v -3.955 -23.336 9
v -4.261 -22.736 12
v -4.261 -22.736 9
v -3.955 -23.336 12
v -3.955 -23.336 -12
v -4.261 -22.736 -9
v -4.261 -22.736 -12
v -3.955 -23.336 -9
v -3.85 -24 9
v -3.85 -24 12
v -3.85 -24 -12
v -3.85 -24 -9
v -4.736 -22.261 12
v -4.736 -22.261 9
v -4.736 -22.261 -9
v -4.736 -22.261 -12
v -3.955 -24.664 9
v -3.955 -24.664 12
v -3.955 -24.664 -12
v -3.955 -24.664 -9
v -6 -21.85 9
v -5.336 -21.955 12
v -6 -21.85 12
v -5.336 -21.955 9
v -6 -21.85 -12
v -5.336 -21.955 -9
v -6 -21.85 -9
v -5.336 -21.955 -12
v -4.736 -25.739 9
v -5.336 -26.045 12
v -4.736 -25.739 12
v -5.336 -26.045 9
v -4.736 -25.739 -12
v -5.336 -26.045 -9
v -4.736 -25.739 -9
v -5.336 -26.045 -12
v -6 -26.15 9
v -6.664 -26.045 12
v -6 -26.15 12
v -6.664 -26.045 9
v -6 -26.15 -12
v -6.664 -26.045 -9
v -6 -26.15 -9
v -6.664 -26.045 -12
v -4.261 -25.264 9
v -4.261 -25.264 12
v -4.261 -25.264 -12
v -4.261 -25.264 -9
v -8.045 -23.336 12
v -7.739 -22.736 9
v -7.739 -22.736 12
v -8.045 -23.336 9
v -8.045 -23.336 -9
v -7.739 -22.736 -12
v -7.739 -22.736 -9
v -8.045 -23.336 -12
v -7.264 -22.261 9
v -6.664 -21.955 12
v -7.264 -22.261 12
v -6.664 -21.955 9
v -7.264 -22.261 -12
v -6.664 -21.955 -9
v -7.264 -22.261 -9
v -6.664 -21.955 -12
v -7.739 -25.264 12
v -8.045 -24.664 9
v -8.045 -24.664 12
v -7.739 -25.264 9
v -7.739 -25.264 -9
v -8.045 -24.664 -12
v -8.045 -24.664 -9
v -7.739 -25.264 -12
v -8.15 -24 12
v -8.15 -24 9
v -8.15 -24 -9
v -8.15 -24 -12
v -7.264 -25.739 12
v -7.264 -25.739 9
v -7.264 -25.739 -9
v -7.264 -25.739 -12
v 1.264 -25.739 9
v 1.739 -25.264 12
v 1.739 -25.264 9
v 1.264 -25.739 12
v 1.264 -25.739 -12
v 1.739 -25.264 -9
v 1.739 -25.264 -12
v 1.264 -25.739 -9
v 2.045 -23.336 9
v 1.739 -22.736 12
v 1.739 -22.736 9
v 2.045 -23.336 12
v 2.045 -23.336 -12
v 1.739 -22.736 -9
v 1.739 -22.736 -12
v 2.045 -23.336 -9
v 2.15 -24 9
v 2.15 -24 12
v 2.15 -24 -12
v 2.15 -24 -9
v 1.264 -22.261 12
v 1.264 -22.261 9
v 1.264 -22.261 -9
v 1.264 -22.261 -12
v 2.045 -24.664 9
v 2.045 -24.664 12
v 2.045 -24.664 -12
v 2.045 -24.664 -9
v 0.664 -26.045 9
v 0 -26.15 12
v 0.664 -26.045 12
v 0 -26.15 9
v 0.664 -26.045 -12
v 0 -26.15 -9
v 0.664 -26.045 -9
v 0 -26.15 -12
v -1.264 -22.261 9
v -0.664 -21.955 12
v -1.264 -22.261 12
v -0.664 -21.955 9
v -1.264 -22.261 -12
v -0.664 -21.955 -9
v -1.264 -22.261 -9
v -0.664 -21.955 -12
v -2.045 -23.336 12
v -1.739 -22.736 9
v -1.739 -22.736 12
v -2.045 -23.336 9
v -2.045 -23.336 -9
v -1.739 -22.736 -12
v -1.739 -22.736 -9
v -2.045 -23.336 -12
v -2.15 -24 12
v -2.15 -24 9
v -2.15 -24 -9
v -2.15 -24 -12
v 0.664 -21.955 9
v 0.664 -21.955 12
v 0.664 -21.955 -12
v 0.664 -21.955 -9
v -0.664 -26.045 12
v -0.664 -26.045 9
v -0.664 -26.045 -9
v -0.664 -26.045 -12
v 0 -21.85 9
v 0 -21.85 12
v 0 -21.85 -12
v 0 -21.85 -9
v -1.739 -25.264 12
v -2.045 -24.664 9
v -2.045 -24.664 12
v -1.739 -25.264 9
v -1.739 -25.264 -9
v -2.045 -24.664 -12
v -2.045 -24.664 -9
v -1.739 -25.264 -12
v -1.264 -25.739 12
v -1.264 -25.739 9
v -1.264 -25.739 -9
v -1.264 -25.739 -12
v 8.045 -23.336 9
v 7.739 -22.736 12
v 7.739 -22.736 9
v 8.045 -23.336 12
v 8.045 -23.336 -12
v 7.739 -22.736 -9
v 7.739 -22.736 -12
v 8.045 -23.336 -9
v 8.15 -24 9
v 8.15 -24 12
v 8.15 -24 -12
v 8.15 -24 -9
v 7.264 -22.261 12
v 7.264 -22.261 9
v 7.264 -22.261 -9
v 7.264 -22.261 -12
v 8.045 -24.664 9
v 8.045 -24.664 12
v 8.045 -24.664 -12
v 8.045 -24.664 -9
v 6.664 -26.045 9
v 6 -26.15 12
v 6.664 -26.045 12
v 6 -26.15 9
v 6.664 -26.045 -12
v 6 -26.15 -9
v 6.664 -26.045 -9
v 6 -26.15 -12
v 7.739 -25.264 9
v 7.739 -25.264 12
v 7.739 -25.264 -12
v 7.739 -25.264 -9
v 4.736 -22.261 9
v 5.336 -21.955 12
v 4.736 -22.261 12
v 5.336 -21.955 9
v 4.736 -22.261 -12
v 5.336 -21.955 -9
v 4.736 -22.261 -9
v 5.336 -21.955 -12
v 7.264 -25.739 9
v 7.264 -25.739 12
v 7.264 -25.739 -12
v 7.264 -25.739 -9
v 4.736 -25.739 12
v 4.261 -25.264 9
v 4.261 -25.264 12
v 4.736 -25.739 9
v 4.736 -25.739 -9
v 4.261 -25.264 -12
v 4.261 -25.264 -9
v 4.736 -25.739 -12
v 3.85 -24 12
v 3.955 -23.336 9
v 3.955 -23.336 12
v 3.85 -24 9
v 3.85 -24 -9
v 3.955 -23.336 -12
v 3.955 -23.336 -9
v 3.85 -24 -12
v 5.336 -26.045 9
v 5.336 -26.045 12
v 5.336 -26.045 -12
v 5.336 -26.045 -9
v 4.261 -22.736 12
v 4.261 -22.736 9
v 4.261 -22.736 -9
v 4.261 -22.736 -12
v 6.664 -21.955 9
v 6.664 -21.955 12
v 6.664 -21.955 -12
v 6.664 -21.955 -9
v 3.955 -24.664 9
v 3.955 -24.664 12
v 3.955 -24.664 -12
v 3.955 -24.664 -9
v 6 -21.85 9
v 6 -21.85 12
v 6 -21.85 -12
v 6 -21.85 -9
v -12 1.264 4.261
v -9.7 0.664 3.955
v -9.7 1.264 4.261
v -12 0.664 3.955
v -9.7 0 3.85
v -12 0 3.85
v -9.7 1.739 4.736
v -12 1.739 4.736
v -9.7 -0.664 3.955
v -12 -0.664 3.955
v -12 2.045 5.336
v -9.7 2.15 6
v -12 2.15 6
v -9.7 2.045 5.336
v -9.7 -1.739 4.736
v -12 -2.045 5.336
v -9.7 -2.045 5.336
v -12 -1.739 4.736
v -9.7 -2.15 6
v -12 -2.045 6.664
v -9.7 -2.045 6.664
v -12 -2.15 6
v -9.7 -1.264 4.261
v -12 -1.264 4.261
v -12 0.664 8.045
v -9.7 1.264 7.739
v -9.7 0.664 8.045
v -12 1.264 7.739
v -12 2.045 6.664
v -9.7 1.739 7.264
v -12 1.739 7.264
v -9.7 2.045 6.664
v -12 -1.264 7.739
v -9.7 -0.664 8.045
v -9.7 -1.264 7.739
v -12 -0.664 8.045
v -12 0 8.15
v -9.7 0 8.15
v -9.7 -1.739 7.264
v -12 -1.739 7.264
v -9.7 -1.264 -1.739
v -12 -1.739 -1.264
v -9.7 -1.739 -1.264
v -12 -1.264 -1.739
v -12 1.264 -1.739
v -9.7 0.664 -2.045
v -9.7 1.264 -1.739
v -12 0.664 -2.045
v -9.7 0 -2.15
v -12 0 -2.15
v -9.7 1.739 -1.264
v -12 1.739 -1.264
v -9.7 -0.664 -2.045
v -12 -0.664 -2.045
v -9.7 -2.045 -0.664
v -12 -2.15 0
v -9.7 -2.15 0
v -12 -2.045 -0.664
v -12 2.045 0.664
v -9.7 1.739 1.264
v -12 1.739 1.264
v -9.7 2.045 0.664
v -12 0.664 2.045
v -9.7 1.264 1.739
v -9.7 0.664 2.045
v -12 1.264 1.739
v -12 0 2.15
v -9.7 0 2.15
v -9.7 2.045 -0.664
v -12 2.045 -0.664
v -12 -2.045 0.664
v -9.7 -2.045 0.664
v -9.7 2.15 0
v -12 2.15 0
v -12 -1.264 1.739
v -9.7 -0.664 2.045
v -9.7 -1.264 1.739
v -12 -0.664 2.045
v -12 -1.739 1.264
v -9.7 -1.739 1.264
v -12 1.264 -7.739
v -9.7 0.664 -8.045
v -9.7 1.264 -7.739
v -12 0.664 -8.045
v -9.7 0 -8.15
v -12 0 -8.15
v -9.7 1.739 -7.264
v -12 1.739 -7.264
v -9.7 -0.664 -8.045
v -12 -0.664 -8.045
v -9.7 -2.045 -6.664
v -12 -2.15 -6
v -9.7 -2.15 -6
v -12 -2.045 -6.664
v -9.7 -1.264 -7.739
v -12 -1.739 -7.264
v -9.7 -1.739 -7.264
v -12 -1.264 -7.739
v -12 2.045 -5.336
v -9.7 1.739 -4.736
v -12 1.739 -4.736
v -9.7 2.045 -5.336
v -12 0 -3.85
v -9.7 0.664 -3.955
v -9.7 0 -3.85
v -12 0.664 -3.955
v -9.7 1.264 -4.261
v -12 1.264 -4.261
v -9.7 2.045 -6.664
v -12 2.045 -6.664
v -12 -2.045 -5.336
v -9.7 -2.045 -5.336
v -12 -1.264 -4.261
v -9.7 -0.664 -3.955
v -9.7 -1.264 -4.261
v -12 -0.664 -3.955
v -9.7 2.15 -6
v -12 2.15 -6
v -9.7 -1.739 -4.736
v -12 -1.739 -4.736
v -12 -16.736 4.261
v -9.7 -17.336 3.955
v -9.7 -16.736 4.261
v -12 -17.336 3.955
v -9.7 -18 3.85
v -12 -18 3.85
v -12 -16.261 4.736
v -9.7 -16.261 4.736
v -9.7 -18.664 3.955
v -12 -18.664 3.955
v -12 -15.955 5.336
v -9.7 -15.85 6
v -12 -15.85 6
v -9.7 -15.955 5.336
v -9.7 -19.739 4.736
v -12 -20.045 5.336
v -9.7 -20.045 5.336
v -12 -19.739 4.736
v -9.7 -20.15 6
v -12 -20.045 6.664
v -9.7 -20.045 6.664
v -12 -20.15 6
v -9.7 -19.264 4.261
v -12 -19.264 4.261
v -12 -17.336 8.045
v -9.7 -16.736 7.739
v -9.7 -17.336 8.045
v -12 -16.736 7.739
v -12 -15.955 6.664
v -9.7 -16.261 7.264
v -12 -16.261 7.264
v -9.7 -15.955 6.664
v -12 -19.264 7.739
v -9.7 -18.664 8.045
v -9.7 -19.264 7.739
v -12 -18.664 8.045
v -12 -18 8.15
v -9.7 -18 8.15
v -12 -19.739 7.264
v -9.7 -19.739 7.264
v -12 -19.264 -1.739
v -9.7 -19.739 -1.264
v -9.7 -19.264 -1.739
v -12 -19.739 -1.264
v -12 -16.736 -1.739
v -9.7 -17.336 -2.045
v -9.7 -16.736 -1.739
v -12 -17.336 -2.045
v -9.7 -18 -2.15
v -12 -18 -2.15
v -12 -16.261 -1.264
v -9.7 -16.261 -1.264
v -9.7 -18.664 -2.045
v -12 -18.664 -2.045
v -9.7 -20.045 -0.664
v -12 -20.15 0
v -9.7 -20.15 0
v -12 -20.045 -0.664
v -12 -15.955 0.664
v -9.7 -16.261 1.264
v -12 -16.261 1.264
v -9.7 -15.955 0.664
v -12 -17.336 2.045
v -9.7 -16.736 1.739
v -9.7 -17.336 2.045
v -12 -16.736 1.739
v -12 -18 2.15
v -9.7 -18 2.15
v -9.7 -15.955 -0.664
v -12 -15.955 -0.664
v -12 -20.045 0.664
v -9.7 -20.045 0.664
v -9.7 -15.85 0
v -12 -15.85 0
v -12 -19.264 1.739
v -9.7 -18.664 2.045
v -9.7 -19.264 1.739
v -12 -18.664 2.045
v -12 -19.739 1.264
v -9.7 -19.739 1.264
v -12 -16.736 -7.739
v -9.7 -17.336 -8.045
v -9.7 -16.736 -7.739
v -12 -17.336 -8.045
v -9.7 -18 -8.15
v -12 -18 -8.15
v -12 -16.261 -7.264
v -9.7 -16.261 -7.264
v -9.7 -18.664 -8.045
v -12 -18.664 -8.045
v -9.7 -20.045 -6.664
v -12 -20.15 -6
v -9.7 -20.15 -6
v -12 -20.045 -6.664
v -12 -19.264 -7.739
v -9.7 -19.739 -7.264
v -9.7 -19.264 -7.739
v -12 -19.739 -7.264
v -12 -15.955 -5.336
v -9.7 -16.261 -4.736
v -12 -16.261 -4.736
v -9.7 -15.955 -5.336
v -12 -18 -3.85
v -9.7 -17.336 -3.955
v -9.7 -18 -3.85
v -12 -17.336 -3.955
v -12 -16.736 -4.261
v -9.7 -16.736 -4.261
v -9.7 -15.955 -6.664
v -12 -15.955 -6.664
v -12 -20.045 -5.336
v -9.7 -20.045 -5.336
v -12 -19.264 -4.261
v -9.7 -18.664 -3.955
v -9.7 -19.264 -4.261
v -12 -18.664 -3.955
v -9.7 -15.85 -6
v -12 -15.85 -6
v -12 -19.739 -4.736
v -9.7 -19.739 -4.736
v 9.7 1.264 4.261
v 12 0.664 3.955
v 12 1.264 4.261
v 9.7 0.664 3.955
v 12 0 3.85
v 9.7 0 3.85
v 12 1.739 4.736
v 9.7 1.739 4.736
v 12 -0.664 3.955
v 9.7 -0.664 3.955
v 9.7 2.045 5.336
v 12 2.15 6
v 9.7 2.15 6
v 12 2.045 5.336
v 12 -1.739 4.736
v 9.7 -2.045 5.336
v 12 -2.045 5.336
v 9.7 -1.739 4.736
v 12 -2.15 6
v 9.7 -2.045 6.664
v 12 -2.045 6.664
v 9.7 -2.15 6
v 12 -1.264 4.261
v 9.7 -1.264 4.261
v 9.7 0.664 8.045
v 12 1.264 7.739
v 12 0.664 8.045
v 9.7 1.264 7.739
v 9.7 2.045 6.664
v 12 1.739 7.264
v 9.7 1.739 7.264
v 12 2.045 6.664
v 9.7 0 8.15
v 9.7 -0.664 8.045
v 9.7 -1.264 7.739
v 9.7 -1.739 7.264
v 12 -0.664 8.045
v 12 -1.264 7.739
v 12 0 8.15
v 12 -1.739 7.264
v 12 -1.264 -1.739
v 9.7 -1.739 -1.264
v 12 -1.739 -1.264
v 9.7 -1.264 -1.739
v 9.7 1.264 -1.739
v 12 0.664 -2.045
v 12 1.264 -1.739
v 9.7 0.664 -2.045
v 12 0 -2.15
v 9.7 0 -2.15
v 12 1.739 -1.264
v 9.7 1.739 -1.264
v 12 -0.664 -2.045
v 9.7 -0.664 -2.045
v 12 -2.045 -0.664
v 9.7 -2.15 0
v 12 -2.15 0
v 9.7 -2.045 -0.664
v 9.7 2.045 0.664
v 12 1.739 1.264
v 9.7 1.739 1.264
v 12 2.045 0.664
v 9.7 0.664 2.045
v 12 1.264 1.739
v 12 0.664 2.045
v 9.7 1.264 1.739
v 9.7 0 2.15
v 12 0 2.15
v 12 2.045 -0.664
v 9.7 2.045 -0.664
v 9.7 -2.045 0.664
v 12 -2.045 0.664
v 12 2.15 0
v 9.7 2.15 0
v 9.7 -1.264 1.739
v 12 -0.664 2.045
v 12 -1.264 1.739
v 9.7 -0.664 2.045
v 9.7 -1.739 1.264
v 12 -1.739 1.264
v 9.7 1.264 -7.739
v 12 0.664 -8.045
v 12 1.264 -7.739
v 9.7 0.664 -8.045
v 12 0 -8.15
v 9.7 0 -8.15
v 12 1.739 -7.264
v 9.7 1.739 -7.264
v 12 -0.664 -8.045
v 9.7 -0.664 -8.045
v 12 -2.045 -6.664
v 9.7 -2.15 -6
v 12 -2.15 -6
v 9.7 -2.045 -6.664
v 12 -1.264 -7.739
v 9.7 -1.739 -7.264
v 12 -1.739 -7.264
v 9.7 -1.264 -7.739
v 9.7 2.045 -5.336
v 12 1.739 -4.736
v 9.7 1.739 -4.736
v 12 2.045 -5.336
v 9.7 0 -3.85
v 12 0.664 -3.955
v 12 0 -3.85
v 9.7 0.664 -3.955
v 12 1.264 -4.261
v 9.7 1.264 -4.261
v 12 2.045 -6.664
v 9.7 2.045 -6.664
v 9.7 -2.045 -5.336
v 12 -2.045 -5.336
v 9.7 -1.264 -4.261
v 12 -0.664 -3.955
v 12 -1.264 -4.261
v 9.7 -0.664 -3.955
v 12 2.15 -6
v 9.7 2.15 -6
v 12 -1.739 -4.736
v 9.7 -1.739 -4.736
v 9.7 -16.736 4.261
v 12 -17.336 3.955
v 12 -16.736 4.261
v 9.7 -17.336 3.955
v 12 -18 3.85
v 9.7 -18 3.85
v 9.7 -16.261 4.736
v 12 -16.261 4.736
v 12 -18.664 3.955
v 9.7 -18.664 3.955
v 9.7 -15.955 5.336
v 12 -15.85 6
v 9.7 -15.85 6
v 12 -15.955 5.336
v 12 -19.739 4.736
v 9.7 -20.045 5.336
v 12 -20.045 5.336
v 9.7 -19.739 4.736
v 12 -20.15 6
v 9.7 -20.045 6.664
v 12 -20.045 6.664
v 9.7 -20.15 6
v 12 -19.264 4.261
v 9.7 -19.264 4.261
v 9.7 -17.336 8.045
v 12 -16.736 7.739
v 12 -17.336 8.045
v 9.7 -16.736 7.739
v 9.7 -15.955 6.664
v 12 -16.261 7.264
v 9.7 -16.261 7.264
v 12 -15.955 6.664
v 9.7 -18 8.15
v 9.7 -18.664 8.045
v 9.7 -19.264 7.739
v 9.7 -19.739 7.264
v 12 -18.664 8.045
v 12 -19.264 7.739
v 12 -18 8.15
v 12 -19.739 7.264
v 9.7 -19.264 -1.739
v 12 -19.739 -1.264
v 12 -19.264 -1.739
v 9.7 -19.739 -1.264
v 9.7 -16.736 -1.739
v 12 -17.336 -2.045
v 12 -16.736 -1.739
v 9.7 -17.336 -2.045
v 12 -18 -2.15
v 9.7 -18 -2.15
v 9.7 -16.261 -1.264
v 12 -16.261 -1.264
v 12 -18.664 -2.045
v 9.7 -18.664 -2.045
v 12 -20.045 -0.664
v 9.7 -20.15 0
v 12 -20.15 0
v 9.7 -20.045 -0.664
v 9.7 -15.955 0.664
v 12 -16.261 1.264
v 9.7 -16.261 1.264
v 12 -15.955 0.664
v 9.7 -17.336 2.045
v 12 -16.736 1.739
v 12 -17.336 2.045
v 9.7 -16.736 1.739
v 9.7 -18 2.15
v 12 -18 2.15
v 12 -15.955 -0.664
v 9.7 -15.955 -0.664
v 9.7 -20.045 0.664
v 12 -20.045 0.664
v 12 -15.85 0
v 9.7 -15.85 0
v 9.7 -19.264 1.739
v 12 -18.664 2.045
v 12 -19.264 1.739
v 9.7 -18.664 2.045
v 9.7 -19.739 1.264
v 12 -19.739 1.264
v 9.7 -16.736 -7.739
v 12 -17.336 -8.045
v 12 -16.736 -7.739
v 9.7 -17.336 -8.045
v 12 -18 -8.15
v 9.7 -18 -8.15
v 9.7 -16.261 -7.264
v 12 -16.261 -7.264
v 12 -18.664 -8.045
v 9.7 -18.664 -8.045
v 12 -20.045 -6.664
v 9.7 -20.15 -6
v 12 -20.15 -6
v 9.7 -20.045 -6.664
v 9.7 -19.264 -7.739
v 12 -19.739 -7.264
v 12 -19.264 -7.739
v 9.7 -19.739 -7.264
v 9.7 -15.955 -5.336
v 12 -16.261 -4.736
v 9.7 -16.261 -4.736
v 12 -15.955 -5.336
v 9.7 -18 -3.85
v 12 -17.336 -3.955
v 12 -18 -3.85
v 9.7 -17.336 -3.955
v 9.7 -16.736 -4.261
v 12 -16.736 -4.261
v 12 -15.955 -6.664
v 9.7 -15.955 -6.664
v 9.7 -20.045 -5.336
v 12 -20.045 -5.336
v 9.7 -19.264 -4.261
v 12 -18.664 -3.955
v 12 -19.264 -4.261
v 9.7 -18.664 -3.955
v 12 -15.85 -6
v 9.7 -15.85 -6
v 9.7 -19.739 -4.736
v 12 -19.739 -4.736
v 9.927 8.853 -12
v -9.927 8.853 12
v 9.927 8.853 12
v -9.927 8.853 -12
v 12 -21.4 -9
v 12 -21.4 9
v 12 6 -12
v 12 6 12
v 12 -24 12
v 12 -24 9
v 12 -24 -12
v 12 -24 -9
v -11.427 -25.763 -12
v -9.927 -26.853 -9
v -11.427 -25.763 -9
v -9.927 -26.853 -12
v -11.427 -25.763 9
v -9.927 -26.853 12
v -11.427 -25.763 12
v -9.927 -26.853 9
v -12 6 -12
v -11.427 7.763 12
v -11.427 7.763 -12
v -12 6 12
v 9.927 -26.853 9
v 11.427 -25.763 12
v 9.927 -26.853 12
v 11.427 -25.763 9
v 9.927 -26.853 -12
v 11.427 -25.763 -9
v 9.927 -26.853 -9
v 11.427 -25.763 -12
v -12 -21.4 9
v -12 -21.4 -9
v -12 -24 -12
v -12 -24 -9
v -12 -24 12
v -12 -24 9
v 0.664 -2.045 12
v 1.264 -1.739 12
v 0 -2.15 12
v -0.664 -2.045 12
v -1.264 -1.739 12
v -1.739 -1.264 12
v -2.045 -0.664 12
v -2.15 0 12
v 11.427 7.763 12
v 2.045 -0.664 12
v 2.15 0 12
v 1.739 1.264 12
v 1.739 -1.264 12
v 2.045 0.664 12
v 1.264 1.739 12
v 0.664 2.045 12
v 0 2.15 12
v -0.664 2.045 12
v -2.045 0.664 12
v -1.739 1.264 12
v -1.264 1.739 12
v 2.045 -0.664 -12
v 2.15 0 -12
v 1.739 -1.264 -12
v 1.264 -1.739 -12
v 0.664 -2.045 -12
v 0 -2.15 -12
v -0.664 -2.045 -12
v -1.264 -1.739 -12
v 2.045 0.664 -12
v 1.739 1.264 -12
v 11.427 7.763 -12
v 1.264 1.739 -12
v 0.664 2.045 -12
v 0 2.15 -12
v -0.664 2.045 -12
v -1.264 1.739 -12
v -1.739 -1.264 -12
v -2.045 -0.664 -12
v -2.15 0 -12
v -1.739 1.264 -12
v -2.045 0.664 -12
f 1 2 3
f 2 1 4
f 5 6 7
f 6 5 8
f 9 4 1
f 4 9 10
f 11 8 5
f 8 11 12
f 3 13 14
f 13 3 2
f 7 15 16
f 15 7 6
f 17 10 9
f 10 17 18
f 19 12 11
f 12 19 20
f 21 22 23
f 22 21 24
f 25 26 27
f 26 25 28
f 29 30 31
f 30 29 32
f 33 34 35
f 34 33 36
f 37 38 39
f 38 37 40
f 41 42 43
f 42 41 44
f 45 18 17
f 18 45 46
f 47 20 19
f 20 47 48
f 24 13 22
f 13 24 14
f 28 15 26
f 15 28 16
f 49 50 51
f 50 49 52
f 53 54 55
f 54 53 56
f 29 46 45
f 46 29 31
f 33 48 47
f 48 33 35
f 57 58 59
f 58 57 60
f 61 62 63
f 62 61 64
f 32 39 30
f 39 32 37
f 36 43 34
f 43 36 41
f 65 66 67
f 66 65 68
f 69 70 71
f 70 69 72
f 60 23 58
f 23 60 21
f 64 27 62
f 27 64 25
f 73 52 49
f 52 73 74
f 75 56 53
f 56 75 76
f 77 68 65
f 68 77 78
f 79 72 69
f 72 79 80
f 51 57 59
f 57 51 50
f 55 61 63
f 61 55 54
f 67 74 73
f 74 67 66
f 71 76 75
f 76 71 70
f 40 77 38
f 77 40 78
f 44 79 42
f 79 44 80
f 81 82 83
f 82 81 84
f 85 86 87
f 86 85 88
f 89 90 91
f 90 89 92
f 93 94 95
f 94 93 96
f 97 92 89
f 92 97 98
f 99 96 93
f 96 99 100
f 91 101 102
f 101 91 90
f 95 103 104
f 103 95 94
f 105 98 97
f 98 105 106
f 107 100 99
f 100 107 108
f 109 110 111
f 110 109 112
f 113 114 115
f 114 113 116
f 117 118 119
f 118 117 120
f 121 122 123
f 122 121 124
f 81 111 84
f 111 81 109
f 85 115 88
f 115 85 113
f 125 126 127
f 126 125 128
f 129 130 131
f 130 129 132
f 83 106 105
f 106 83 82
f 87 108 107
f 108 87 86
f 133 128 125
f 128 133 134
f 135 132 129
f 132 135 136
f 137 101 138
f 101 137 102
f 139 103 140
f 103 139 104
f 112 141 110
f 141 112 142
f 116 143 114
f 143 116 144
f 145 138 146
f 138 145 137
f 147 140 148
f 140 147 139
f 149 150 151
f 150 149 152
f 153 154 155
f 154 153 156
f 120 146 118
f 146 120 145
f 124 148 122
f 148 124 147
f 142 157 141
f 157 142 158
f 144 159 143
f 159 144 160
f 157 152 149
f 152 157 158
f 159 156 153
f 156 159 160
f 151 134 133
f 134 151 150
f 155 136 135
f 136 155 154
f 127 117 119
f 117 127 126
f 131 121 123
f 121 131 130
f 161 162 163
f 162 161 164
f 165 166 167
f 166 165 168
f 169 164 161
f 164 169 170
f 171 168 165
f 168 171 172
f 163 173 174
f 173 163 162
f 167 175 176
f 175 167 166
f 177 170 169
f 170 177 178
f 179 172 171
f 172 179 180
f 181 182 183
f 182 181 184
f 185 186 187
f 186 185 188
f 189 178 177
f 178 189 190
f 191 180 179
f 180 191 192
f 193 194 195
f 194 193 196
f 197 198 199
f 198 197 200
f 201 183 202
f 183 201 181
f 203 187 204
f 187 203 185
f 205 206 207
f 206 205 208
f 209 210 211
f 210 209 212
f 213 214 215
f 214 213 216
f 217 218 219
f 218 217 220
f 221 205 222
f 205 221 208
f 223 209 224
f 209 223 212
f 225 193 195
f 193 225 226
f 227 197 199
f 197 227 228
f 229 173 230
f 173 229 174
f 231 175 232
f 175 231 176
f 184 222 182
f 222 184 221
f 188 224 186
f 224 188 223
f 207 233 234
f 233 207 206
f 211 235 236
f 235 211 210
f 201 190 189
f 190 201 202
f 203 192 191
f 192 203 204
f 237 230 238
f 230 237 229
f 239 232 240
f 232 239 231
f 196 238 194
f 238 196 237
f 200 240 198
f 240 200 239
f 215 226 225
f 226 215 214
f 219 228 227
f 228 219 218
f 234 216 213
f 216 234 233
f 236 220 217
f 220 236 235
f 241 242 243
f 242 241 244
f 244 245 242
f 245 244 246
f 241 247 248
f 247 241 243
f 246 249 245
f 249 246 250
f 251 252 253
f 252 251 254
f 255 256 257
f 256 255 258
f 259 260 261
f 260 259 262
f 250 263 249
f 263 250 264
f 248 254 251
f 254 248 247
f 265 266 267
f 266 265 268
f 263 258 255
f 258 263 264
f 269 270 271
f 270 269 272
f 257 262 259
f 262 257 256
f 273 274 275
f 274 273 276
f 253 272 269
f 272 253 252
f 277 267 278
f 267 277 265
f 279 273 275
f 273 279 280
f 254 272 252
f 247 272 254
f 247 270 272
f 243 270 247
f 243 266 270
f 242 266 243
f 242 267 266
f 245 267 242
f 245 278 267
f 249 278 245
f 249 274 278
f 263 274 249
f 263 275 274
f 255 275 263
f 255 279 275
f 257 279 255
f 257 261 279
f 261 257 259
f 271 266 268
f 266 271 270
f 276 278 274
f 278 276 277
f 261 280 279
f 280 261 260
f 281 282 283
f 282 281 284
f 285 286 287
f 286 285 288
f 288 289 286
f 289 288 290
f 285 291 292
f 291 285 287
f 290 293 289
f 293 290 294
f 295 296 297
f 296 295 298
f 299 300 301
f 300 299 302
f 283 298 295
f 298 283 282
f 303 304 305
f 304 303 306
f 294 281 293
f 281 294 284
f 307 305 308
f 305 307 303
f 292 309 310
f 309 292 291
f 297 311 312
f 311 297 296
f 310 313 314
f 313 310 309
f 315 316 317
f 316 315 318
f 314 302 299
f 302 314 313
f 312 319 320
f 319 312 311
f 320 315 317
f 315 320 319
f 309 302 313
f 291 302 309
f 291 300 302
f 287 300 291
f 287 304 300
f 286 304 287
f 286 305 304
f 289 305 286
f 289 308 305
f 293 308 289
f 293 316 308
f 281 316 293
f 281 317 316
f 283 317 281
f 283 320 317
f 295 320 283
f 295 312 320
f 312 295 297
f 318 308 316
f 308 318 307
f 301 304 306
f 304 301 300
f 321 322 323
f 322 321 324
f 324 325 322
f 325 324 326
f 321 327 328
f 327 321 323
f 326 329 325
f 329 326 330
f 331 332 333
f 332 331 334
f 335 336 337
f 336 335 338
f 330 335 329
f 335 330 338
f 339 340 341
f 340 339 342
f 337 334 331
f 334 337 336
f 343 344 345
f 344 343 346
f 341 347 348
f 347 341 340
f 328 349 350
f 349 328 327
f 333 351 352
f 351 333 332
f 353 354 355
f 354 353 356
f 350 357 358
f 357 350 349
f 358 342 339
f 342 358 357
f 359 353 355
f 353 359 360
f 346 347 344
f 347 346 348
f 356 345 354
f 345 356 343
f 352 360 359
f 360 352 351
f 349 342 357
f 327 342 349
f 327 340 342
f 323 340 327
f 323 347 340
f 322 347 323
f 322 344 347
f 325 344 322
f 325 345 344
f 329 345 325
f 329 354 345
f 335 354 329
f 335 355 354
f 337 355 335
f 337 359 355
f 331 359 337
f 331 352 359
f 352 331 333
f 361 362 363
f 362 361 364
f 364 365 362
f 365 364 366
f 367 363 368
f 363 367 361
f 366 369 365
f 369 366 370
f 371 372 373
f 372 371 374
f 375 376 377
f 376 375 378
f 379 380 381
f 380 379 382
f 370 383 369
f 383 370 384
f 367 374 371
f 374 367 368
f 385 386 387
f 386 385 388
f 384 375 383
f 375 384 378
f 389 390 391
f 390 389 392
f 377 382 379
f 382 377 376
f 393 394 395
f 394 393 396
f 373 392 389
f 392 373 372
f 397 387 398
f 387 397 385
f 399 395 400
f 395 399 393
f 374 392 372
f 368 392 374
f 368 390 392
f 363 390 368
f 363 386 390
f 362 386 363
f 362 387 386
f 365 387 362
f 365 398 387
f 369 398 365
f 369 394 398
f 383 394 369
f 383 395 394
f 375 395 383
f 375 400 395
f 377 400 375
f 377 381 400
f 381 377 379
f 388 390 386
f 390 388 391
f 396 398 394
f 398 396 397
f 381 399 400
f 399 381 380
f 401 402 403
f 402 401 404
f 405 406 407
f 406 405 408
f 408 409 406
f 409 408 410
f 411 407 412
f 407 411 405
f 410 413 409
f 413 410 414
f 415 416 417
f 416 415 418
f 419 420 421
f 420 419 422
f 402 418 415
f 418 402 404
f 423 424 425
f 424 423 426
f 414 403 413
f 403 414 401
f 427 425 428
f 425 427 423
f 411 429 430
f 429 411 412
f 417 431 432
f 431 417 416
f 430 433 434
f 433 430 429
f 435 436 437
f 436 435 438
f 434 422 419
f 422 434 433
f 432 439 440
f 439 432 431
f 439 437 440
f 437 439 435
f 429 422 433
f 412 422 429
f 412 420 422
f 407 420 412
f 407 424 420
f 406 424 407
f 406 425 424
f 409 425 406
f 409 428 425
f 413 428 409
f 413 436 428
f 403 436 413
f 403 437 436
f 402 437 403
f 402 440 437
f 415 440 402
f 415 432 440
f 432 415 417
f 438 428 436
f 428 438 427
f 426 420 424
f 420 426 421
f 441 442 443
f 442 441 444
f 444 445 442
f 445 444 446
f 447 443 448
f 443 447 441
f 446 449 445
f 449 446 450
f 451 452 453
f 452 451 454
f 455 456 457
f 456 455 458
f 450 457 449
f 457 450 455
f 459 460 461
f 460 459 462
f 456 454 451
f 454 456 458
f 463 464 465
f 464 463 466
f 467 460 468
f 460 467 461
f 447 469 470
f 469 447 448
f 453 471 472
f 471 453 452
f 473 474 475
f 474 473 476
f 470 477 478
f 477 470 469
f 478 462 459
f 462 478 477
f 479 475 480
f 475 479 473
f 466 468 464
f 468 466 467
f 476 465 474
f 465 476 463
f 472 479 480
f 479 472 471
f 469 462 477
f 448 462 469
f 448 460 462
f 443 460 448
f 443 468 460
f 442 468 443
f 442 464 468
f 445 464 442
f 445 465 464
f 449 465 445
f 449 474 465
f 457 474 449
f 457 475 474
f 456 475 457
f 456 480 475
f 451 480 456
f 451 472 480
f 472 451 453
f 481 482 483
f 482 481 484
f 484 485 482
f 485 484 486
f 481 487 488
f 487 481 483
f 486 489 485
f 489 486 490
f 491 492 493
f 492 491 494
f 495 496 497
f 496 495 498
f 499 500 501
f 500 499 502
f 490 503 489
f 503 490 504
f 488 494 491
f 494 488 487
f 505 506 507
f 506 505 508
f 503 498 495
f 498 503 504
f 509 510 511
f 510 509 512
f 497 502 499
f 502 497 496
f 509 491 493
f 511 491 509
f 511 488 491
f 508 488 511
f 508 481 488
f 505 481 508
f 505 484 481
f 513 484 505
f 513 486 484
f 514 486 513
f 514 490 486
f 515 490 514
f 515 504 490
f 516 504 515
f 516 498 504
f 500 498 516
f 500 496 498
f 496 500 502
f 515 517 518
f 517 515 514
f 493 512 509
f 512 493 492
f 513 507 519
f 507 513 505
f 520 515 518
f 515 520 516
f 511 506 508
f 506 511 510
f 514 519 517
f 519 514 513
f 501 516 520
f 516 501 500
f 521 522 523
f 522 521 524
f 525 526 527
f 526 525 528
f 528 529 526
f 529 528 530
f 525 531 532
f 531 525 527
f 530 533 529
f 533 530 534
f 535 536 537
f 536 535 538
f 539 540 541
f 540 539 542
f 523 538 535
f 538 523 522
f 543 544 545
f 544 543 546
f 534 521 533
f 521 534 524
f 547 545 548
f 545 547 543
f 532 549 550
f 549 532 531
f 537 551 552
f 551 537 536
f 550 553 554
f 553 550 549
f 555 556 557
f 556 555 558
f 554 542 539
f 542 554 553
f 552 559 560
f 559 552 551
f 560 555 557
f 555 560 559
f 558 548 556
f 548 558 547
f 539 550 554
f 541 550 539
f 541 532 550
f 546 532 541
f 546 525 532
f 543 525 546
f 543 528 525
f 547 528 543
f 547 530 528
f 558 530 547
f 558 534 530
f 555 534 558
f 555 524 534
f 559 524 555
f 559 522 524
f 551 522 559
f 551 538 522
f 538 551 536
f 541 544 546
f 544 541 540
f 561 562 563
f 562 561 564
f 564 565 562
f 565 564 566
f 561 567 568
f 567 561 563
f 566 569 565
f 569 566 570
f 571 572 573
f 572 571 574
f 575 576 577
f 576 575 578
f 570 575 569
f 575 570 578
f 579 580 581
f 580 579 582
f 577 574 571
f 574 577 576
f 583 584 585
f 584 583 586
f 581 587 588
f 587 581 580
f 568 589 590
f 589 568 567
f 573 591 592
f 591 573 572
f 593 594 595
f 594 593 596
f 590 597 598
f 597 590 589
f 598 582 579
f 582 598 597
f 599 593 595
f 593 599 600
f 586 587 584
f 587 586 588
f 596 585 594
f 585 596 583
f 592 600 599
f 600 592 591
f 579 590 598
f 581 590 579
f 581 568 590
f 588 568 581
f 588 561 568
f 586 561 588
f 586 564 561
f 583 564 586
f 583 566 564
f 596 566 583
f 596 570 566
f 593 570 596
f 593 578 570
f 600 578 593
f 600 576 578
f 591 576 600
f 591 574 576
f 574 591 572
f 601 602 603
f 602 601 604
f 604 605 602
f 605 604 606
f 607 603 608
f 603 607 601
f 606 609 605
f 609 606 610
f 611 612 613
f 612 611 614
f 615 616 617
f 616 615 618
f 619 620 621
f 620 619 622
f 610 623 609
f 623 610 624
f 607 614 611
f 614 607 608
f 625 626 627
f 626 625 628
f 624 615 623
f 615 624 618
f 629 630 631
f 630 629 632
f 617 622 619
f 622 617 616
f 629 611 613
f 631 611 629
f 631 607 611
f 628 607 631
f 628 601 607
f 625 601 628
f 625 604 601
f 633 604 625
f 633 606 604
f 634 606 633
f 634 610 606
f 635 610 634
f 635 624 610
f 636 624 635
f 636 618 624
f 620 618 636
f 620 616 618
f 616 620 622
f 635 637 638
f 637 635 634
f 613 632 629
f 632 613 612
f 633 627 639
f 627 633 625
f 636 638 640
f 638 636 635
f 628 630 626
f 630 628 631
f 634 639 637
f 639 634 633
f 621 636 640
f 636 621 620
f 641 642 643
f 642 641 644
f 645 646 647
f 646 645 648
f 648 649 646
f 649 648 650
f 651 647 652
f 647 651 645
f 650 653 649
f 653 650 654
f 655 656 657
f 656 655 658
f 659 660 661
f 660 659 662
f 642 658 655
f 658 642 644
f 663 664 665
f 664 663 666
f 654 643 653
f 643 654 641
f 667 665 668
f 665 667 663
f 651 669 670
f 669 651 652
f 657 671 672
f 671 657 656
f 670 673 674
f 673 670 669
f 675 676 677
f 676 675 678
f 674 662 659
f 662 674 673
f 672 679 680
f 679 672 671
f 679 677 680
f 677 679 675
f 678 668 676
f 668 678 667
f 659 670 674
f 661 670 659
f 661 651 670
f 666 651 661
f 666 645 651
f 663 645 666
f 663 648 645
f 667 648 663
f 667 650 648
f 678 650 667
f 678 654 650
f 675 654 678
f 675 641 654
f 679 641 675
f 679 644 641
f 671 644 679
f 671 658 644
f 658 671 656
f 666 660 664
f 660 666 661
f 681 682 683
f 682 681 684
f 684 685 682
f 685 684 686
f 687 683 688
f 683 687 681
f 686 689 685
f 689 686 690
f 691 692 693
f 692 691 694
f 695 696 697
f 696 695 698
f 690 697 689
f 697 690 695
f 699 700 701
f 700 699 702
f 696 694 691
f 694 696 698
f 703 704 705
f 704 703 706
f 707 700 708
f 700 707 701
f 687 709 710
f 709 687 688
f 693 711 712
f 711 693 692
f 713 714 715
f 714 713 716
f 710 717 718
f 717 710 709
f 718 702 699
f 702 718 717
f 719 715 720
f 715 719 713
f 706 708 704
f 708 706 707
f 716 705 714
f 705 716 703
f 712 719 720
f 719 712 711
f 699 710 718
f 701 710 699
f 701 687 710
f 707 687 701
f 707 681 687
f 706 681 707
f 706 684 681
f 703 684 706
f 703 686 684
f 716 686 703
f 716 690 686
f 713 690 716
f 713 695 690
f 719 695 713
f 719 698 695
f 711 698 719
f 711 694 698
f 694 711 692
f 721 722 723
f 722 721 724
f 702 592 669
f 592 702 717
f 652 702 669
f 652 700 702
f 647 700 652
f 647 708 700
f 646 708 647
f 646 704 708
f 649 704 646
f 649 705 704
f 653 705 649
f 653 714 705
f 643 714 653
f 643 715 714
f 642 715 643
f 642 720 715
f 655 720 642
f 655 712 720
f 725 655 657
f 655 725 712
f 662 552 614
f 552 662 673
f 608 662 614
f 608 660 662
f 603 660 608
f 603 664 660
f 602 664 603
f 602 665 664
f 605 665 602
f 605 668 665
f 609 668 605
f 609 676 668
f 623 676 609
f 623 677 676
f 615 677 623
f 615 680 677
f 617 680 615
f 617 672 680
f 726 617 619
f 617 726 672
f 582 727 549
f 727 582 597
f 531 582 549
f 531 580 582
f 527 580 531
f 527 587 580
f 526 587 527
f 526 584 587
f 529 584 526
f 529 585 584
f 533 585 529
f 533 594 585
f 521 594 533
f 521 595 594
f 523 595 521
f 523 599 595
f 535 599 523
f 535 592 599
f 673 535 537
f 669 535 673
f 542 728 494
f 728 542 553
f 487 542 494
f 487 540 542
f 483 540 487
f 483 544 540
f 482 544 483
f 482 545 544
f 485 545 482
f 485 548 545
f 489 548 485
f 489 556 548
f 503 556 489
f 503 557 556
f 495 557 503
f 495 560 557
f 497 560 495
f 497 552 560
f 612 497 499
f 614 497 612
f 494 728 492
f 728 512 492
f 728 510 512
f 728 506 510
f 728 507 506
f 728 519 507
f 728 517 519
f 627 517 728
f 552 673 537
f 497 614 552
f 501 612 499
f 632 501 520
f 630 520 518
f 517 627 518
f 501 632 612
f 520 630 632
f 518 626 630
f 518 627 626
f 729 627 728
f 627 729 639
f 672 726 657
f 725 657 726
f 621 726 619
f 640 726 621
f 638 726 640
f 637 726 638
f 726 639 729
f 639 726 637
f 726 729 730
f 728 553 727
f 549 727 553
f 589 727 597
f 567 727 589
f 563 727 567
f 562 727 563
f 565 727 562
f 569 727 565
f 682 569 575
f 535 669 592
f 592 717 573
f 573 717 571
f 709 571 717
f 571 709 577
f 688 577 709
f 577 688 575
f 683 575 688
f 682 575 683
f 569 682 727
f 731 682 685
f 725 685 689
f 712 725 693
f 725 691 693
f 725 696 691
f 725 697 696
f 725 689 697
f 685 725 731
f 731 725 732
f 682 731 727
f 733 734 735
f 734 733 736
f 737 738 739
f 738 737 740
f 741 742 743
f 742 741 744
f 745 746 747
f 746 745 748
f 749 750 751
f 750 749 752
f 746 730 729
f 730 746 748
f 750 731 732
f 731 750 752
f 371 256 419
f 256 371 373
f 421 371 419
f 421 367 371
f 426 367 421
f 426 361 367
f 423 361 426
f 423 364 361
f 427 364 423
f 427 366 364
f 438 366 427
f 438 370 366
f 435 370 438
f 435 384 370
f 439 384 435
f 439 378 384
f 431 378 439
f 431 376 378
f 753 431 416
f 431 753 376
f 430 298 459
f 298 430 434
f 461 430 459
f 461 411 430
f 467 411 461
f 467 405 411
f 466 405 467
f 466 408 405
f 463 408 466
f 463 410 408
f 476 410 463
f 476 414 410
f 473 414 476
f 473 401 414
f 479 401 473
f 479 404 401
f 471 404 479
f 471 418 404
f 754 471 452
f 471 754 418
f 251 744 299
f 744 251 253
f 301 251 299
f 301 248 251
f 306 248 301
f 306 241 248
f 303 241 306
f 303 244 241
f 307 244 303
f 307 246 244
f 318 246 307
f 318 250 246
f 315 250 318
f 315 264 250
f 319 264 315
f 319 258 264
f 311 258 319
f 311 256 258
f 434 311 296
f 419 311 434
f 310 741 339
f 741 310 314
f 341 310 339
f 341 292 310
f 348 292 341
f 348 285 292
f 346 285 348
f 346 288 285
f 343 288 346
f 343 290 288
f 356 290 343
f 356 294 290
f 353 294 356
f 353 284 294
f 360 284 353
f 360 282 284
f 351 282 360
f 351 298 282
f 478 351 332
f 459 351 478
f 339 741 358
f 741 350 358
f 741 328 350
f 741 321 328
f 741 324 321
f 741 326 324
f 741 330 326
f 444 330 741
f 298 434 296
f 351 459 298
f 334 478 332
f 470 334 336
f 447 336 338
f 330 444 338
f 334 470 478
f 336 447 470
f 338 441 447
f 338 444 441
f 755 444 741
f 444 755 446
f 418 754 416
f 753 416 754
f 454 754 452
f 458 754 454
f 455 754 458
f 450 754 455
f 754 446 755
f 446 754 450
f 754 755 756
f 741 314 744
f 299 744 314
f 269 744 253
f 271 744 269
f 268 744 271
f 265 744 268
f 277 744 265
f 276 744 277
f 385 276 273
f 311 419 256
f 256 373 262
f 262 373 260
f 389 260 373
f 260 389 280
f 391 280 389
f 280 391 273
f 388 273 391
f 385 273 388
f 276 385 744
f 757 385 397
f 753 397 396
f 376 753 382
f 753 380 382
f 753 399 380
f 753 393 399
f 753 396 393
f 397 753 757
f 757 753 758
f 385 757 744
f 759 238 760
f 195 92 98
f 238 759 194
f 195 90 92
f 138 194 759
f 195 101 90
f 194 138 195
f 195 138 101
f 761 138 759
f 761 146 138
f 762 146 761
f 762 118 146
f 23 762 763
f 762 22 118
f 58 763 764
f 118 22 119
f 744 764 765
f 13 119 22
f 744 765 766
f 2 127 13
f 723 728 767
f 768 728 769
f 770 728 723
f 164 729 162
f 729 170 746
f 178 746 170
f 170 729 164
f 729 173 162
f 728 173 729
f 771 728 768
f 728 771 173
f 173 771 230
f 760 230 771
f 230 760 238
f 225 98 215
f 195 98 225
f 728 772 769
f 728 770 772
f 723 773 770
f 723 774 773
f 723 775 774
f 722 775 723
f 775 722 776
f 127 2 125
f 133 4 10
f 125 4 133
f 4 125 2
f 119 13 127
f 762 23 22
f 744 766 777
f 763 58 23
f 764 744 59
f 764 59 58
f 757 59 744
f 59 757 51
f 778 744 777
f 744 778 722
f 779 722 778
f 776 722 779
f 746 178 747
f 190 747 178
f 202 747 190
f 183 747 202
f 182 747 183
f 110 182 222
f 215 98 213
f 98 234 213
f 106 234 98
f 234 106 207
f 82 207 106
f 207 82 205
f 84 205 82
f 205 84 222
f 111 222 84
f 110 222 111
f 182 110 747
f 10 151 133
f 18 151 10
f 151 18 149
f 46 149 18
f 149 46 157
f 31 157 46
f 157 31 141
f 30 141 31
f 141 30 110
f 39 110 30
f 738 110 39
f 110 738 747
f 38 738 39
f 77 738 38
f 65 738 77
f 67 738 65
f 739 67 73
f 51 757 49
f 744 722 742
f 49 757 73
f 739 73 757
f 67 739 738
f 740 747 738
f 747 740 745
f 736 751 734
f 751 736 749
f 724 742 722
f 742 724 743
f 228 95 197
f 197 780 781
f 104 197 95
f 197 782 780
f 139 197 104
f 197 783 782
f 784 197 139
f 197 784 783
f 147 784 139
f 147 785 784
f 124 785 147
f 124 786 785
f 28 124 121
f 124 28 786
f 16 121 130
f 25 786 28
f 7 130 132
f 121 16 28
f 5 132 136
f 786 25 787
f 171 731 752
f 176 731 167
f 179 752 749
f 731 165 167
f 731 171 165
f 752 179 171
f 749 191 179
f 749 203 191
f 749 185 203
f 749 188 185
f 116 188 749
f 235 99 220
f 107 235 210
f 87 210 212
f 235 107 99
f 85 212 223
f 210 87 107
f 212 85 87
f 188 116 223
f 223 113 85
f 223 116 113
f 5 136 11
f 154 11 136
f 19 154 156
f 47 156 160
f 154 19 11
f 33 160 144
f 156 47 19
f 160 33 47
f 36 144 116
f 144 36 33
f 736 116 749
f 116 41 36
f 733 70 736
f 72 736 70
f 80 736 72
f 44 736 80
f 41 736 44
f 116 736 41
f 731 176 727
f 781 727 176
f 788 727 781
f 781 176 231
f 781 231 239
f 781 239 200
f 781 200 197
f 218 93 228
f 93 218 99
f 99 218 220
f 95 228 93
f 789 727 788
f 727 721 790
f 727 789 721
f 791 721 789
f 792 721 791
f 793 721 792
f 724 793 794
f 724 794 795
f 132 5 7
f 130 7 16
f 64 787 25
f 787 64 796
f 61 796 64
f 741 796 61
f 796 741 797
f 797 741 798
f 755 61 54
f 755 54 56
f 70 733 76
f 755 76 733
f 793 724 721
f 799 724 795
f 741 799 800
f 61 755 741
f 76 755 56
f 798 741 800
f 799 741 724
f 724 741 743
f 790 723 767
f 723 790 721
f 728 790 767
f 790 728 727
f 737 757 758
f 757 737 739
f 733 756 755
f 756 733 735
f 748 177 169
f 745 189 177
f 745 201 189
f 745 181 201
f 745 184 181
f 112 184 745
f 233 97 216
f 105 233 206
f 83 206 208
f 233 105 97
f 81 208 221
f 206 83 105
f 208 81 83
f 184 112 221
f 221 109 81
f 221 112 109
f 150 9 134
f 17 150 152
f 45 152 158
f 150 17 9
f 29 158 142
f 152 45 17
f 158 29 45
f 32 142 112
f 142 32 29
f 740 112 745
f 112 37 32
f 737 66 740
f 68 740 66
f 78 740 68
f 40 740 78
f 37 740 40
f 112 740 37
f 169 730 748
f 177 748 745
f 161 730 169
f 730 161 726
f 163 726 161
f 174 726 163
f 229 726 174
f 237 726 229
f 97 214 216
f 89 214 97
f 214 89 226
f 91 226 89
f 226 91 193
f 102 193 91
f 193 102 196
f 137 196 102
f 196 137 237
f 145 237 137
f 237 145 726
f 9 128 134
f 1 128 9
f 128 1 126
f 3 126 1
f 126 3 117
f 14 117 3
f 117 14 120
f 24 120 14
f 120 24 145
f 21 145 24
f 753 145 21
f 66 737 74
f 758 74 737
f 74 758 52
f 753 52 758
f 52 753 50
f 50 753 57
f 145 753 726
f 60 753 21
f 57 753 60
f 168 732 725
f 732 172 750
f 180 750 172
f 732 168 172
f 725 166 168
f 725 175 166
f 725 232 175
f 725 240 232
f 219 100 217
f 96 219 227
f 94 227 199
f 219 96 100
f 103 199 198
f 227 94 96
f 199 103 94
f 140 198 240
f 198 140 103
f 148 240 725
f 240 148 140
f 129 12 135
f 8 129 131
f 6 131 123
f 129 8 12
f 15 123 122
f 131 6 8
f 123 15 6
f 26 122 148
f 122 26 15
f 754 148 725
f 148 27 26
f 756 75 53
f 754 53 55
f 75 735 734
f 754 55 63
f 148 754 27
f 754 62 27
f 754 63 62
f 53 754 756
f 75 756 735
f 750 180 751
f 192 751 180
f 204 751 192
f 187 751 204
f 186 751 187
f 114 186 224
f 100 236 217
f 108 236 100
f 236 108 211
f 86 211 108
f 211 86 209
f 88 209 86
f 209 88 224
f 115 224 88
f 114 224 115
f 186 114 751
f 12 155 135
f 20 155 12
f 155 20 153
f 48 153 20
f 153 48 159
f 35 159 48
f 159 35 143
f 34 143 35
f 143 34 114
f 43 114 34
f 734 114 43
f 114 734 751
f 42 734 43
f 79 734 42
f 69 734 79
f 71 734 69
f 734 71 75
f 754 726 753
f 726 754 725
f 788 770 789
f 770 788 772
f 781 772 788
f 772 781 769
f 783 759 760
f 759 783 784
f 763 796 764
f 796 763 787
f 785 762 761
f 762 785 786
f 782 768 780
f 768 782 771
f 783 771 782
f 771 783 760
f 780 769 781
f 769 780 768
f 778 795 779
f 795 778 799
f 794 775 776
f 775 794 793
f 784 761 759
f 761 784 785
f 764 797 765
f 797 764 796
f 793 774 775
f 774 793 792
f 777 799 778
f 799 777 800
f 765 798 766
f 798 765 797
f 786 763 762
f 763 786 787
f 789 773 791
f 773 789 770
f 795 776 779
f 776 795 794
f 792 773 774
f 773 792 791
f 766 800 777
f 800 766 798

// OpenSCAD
// file: ../util/rounded.scad
// Do a rounded cube
module roundedFinal(x,y,z,r){
    translate([r,r,0]){
        minkowski() {
            cube([x-2*r,y-2*r,z/2]);
            cylinder(h=z/2, r=r);
        }
    }
}

module rounded(x=10, y=10, z=10, r=3, center=false) {
  if (center) {
      translate([-(x/2),-(y/2),0]){
          roundedFinal(x, y, z, r);
      }
  } else {
      roundedFinal(x, y, z, r);
  }
}
// file: ../models/ollo.scad
// Diameter of plastic ollo holes
OlloHoles = 4.3;

// Width of Ollo "real" plastic
OlloWidth = 3;

// Distance between two ollo holes
OlloSpacing = 6;

// Do an Ollo hole on the part
module olloHole(depth=2.2)
{
    translate([0,0,-0.1])
      cylinder(depth+0.2, OlloHoles/2, OlloHoles/2, $fn=20);
}

// Do 3 ollo holes
module threeOllo(depth=2.2)
{
  for (xy=[[-OlloSpacing,0],[0,0],[OlloSpacing,0]]) {
    translate([xy[0], xy[1], 0])
    olloHole(depth);
  }
}

// Do a servo arm holes
module servoArm(depth=2.2)
{
    threeOllo(depth);
    rotate([0,0,90])
    threeOllo(depth);
}
// file: ../models/screw.scad
//TODO check
screwDiameter = 2.5;

module screwHole(depth){
    cylinder(h=depth, screwDiameter); 
}
// file: ../models/motor.scad
include <ollo.scad>;
use <../util/rounded.scad>;

// Motor dimensions
MotorWidth = 24; 
MotorHeight = 36; 
MotorDepth = 24; 
MotorArmOffset = 9;

module motor(width=2.2) {
    translate([0,-MotorArmOffset,-MotorDepth/2]) {
        color([0.25,0.25,0.25]) {
	          difference() {
  	            rounded(MotorWidth,MotorHeight,MotorDepth,3,center=true);
                
		            // Bottom
                translate([-MotorWidth/2-0.1,-MotorHeight/2-0.1,3]){
	                  cube([MotorWidth+0.2, 5.7, MotorDepth-6]);
                }
                
		            translate([0,-MotorHeight/2+3]){
		                threeOllo(MotorDepth);
                }
                
		            // Motor shaft
	              translate([0, MotorArmOffset]){
     	              olloHole(MotorDepth+5);
                }
                
		            // Side holes
		            for (side=[-MotorWidth/2,MotorWidth/2-width]) {
		                translate([side,9,MotorDepth/2]) {
		                    rotate([0,90,0]) {
		                        threeOllo();
			                      translate([0,-3*OlloSpacing,0])
			                      threeOllo();
		                    }
		                }
		            }
	          }
        }
	  }
}

motor();
// main file
include <../models/motor.scad>
use <../models/screw.scad>

minLongSideULength = 30;

depth = 2.2;

module longSideUStruct(length){
    margin = 2 * OlloSpacing;
    translate([-MotorDepth / 2, -(MotorWidth/2 + depth), 0]){
        difference(){
            cube([MotorDepth, MotorWidth + 2 * depth, length + margin]);
            translate([0,depth,depth]){
                cube([MotorDepth, MotorWidth, length + margin - depth]);
            }
        }
    }
}

module longSideUServoFixHoles(length){
    translate([0,MotorWidth/2 + depth,length]){
        rotate([90,0,0]){
            threeOllo(MotorWidth + 2 * depth);
            translate([0,-18,0]){
                threeOllo(MotorWidth + 2 * depth);
            }
        }
    }
}

module longSideUFixHoles(){
    fixMargin = OlloSpacing;
    dx = MotorWidth / 2 - fixMargin;
    dy = MotorDepth / 2 - fixMargin;
    translate([ dx, dy,0]) screwHole(depth);
    translate([ dx,-dy,0]) screwHole(depth);
    translate([-dx, dy,0]) screwHole(depth);
    translate([-dx,-dy,0]) screwHole(depth);
}

module longSideU(length = minLongSideULength){
    difference(){
        longSideUStruct(length);
        longSideUServoFixHoles(length);
        #longSideUFixHoles();
    }
}
